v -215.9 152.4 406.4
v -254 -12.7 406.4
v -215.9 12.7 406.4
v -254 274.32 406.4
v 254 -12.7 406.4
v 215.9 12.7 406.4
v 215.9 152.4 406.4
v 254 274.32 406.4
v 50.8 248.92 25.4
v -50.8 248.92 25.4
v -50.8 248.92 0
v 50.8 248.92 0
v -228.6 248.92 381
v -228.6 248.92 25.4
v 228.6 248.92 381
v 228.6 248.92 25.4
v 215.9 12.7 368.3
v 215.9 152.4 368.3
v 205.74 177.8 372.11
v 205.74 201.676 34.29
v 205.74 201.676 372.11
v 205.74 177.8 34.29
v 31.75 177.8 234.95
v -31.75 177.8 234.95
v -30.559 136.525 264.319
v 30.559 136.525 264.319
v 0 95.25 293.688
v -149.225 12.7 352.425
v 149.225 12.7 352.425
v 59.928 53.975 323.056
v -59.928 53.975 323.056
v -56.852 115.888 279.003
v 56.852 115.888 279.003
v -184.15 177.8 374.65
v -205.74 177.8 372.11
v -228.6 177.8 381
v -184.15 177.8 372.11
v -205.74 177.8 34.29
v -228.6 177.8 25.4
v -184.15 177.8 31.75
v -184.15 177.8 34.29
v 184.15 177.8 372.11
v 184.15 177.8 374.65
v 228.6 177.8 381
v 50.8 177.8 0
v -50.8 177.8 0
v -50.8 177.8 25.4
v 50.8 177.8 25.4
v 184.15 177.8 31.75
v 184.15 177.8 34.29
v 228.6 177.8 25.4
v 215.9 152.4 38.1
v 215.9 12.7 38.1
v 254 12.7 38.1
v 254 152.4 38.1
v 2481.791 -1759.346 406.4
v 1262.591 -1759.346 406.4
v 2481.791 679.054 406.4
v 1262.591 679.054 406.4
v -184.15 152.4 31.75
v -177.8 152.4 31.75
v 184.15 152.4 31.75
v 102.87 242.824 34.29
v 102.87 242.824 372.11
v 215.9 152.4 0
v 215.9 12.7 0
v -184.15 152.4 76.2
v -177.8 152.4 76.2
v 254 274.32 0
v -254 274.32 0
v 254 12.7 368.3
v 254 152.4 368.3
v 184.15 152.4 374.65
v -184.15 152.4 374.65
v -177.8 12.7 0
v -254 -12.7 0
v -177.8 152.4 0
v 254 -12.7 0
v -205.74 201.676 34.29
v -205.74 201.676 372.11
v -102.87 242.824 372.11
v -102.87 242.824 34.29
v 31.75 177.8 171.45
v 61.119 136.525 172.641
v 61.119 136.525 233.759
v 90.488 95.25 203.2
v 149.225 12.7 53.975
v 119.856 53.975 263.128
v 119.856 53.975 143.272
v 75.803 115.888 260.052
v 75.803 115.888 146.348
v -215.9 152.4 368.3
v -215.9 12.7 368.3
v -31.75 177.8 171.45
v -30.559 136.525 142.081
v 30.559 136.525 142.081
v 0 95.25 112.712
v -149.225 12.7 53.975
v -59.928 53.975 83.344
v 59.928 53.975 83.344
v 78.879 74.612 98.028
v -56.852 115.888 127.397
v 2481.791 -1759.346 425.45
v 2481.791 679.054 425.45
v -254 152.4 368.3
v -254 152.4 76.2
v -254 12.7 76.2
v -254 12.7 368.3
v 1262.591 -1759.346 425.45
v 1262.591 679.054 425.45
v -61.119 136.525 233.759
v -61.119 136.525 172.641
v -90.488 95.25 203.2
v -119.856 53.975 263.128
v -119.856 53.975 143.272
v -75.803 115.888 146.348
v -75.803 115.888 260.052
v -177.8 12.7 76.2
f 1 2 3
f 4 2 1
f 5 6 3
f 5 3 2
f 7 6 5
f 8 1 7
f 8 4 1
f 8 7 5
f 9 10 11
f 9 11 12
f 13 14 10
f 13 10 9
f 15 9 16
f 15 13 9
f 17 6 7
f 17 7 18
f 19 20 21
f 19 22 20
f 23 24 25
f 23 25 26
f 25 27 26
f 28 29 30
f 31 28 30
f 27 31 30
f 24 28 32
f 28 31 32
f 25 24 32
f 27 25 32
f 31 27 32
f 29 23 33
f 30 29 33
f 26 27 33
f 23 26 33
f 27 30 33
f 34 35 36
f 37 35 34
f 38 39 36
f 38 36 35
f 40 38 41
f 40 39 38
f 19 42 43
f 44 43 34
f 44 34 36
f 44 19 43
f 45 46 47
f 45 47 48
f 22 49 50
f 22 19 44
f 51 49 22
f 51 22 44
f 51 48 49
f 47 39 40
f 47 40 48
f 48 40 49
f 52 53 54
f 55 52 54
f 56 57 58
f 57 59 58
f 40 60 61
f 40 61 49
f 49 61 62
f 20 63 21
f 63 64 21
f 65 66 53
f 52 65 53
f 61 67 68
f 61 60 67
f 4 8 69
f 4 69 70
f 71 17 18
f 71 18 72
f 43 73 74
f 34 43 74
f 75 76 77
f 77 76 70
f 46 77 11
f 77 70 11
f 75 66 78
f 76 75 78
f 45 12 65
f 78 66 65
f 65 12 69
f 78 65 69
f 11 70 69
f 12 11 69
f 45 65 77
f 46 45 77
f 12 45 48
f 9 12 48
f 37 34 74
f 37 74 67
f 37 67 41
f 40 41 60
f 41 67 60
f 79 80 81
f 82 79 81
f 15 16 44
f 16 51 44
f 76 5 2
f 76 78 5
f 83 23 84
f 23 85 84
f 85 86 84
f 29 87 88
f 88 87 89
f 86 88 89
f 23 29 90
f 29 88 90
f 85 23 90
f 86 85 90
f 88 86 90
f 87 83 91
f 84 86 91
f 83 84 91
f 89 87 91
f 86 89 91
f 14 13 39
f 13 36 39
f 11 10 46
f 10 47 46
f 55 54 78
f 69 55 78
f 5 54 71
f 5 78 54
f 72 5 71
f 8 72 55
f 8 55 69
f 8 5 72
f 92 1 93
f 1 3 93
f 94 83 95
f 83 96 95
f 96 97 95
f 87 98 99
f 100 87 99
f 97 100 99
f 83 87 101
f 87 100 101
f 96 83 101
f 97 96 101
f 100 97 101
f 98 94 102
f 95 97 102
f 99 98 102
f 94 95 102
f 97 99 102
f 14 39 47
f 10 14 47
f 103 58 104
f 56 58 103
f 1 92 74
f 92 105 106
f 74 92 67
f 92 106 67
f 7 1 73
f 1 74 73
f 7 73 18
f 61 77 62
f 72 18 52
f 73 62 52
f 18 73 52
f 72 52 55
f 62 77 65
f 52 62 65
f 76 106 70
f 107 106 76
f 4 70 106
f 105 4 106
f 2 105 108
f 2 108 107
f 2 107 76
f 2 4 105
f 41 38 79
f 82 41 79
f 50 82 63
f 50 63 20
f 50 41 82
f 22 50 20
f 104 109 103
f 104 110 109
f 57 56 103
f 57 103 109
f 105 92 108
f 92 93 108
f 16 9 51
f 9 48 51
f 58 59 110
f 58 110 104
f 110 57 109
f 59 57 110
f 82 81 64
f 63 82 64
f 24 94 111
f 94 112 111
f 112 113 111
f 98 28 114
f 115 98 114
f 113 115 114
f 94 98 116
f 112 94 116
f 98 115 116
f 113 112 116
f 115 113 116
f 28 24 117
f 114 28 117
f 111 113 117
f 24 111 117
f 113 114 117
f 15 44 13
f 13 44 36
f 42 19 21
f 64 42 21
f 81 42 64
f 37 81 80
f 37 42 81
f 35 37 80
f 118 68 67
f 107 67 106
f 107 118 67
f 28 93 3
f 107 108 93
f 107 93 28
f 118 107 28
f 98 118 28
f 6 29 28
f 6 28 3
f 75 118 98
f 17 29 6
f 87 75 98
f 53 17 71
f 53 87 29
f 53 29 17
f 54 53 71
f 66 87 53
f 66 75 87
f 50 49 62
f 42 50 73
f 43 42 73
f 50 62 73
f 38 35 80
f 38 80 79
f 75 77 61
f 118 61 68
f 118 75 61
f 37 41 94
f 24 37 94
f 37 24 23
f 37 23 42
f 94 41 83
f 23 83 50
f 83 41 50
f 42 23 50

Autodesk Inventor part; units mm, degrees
ref_plane "YZ Plane" through (0, 0, 0) normal (1, 0, 0) x (0, 1, 0)
ref_plane "XZ Plane" through (0, 0, 0) normal (0, 1, 0) x (-1, 0, 0)
sketch "Sketch1" plane through (0, 0, 0) normal (0, 0, 1) x (1, 0, 0)
  line L0 (-254, 12.7) -> (254, 12.7)
  line L1 (254, 12.7) -> (254, -12.7)
  line L2 (254, -12.7) -> (-254, -12.7)
  line L3 (-254, -12.7) -> (-254, 12.7)
  point P0 (0, 0)
  point P1 (0, -12.7)
  point P2 (254, 0)
  dimension "d0" = 25.4
  dimension "d1" = 508
extrude "Extrusion1" add sketch "Sketch1" along normal blind 406.4
sketch "Sketch2" plane through (-254, 12.7, 0) normal (0, 1, 0) x (1, 0, 0)
  line L0 (403.225, -53.975) -> (403.225, -352.425)
  line L1 (403.225, -352.425) -> (104.775, -352.425)
  line L2 (104.775, -352.425) -> (104.775, -53.975)
  line L3 (104.775, -53.975) -> (403.225, -53.975)
  line L4 (0, 0) -> (0, -406.4) projected
  line L5 (0, 0) -> (508, 0) projected
  point P0 (254, 0)
  point P1 (254, -203.2)
  point P2 (0, -203.2)
  point P3 (254, 0)
  dimension "d4" = 298.45
ref_plane "Work Plane1" through (-254, 177.8, 0) normal (0, 1, 0) x (1, 0, 0)
sketch "Sketch3" plane through (-254, 177.8, 0) normal (0, 1, 0) x (1, 0, 0)
  line L0 (285.75, -171.45) -> (285.75, -234.95)
  line L1 (285.75, -234.95) -> (222.25, -234.95)
  line L2 (222.25, -234.95) -> (222.25, -171.45)
  line L3 (222.25, -171.45) -> (285.75, -171.45)
  line L4 (0, 0) -> (0, -406.4) projected
  point P0 (254, 0)
  point P1 (254, -203.2)
  point P2 (0, -203.2)
  dimension "d6" = 63.5
loft "Loft1" add profiles "Sketch3", "Sketch2"
sketch "Sketch4" plane through (-31.75, 177.8, 171.45) normal (0, 1, 0) x (1, 0, 0)
  line L0 (-173.99, 137.16) -> (237.49, 137.16)
  line L1 (237.49, 137.16) -> (237.49, -200.66)
  line L2 (237.49, -200.66) -> (-173.99, -200.66)
  line L3 (-173.99, -200.66) -> (-173.99, 137.16)
  line L4 (285.75, 171.45) -> (285.75, -234.95) projected
  point P0 (31.75, 171.45)
  point P1 (31.75, 137.16)
  point P2 (237.49, -31.75)
  point P3 (285.75, -31.75)
  dimension "d11" = 411.48
  dimension "d12" = 337.82
extrude "Extrusion2" add sketch "Sketch4" along normal blind 65.024
sketch "Sketch5" plane through (-205.74, 177.8, 372.11) normal (0, 0, 1) x (1, 0, 0)
  line L0 (0, 0) -> (0, 23.876)
  line L1 (0, 0) -> (0, 65.024) projected
  line L2 (102.87, 65.024) -> (308.61, 65.024)
  line L3 (0, 23.876) -> (102.87, 65.024)
  line L4 (0, 65.024) -> (411.48, 65.024) projected
  line L5 (0, 65.024) -> (102.87, 65.024)
  line L6 (0, 65.024) -> (0, 23.876)
  line L7 (308.61, 65.024) -> (411.48, 23.876)
  line L8 (411.48, 23.876) -> (411.48, 65.024)
  line L9 (411.48, 65.024) -> (308.61, 65.024)
  point P0 (205.74, -177.8)
  point P1 (205.74, 65.024)
  point P2 (205.74, 0)
  dimension "d15" = 23.876
  dimension "d16" = 205.74
extrude "Extrusion3" cut sketch "Sketch5" against normal blind 390.5885
sketch "Sketch6" plane through (-254, 12.7, 0) normal (0, 1, 0) x (1, 0, 0)
  line L0 (0, 0) -> (76.2, 0)
  line L1 (76.2, 0) -> (76.2, -76.2)
  line L2 (76.2, -76.2) -> (0, -76.2)
  line L3 (0, -76.2) -> (0, 0)
  line L4 (0, -406.4) -> (38.1, -406.4)
  line L5 (38.1, -406.4) -> (38.1, -368.3)
  line L6 (38.1, -368.3) -> (0, -368.3)
  line L7 (0, -368.3) -> (0, -406.4)
  line L8 (508, 0) -> (469.9, 0)
  line L9 (469.9, 0) -> (469.9, -38.1)
  line L10 (469.9, -38.1) -> (508, -38.1)
  line L11 (508, -38.1) -> (508, 0)
  line L12 (508, -406.4) -> (469.9, -406.4)
  line L13 (508, -368.3) -> (508, -406.4)
  line L14 (469.9, -368.3) -> (508, -368.3)
  line L15 (469.9, -406.4) -> (469.9, -368.3)
  point P0 (254, 0)
  point P1 (38.1, -38.1)
  point P2 (38.1, 0)
  dimension "d19" = 76.2
extrude "Extrusion4" add sketch "Sketch6" along normal blind 139.7
sketch "Sketch7" plane through (-254, 152.4, 0) normal (0, 1, 0) x (1, 0, 0)
  line L0 (469.9, -406.4) -> (508, -406.4)
  line L1 (0, 0) -> (508, 0)
  line L2 (508, 0) -> (508, -406.4)
  line L3 (508, -406.4) -> (0, -406.4)
  line L4 (0, -406.4) -> (0, 0)
  line L5 (69.85, -31.75) -> (438.15, -31.75)
  line L6 (438.15, -31.75) -> (438.15, -374.65)
  line L7 (438.15, -374.65) -> (69.85, -374.65)
  line L8 (69.85, -374.65) -> (69.85, -31.75)
  line L9 (469.9, -368.3) -> (469.9, -406.4)
  line L10 (38.1, -406.4) -> (38.1, -368.3)
  line L11 (38.1, -38.1) -> (38.1, 0)
  line L12 (469.9, 0) -> (469.9, -38.1)
  point P0 (254, 0)
  point P1 (254, 0)
  dimension "d22" = 31.75
  dimension "d23" = 31.75
  dimension "d24" = 31.75
  dimension "d25" = 31.75
  dimension "d26" = 31.75
  dimension "d27" = 31.75
extrude "Extrusion5" add sketch "Sketch7" along normal blind 25.4
sketch "Sketch8" plane through (-254, 177.8, 0) normal (0, 1, 0) x (1, 0, 0)
  line L0 (0, 0) -> (508, 0)
  line L1 (508, 0) -> (508, -406.4)
  line L2 (508, -406.4) -> (0, -406.4)
  line L3 (0, -406.4) -> (0, 0)
  line L4 (25.4, -25.4) -> (482.6, -25.4)
  line L5 (482.6, -25.4) -> (482.6, -381)
  line L6 (482.6, -381) -> (25.4, -381)
  line L7 (25.4, -381) -> (25.4, -25.4)
  line L8 (304.8, 0) -> (304.8, -25.4)
  line L9 (304.8, -25.4) -> (203.2, -25.4)
  line L10 (203.2, -25.4) -> (203.2, 0)
  point P0 (254, 0)
  point P1 (254, 0)
  dimension "d30" = 25.4
  dimension "d31" = 25.4
  dimension "d32" = 25.4
  dimension "d33" = 25.4
extrude "Extrusion6" add sketch "Sketch8" along normal blind 71.12 contours L0 L10 L4 L7 L6 L5 L8 L1 L2 L3
sketch "Sketch9" plane through (0, 0, 406.4) normal (0, 0, 1) x (1, 0, 0)
  line L0 (-254, 248.92) -> (254, 248.92) projected
  line L1 (-254, 248.92) -> (254, 248.92)
  line L2 (254, 248.92) -> (254, 274.32)
  line L3 (254, 274.32) -> (-254, 274.32)
  line L4 (-254, 274.32) -> (-254, 248.92)
  line L5 (254, -12.7) -> (254, 248.92) projected
  point P0 (0, 0)
  point P1 (254, 261.62)
  point P2 (254, 118.11)
  dimension "d36" = 25.4
extrude "Extrusion7" add sketch "Sketch9" against normal blind 406.4
sketch "Sketch10" plane through (0, 0, 406.4) normal (0, 0, 1) x (1, 0, 0)
  line L0 (1262.5907, 679.0542) -> (2481.7907, 679.0542)
  line L1 (2481.7907, 679.0542) -> (2481.7907, -1759.3458)
  line L2 (2481.7907, -1759.3458) -> (1262.5907, -1759.3458)
  line L3 (1262.5907, -1759.3458) -> (1262.5907, 679.0542)
  point P0 (0, 0)
  dimension "d39" = 1219.2
  dimension "d40" = 2438.4
extrude "Extrusion8" add sketch "Sketch10" along normal blind 19.05
sketch "Sketch11" plane through (0, 0, 425.45) normal (0, 0, 1) x (1, 0, 0)
  line L0 (1262.5907, 679.0542) -> (1262.5907, -1759.3458) projected
  line L1 (1262.5907, 679.0542) -> (1668.9907, 679.0542)
  line L2 (1668.9907, 679.0542) -> (1668.9907, 171.0542)
  line L3 (1668.9907, 171.0542) -> (1262.5907, 171.0542)
  line L4 (1262.5907, 171.0542) -> (1262.5907, 679.0542)
  line L5 (1668.9907, 679.0542) -> (2075.3907, 679.0542)
  line L6 (2075.3907, 679.0542) -> (2075.3907, 171.0542)
  line L7 (2075.3907, 171.0542) -> (1668.9907, 171.0542)
  line L8 (1668.9907, 171.0542) -> (1668.9907, 679.0542)
  line L9 (2075.3907, 679.0542) -> (2481.7907, 679.0542)
  line L10 (2481.7907, 679.0542) -> (2481.7907, 171.0542)
  line L11 (2481.7907, 171.0542) -> (2075.3907, 171.0542)
  line L12 (2075.3907, 171.0542) -> (2075.3907, 679.0542)
  line L13 (1262.5907, 171.0542) -> (1745.1907, 171.0542)
  line L14 (1745.1907, 171.0542) -> (1745.1907, 99.9342)
  line L15 (1745.1907, 99.9342) -> (1262.5907, 99.9342)
  line L16 (1262.5907, 99.9342) -> (1262.5907, 171.0542)
  line L17 (1745.1907, 99.9342) -> (2227.7907, 99.9342)
  line L18 (2227.7907, 99.9342) -> (2227.7907, 171.0542)
  line L19 (2227.7907, 171.0542) -> (1745.1907, 171.0542)
  line L20 (1745.1907, 171.0542) -> (1745.1907, 99.9342)
  line L21 (2298.9107, 171.0542) -> (2227.7907, 171.0542)
  line L22 (2298.9107, 171.0542) -> (2370.0307, 171.0542)
  line L23 (1262.5907, 99.9342) -> (1300.6907, 99.9342)
  line L24 (1300.6907, 99.9342) -> (1300.6907, -39.7658)
  line L25 (1300.6907, -39.7658) -> (1262.5907, -39.7658)
  line L26 (1262.5907, -39.7658) -> (1262.5907, 99.9342)
  line L27 (1300.6907, 99.9342) -> (1338.7907, 99.9342)
  line L28 (1338.7907, 99.9342) -> (1338.7907, -39.7658)
  line L29 (1338.7907, -39.7658) -> (1300.6907, -39.7658)
  line L30 (1300.6907, -39.7658) -> (1300.6907, 99.9342)
  line L31 (1338.7907, 99.9342) -> (1376.8907, 99.9342)
  line L32 (1376.8907, 99.9342) -> (1376.8907, -39.7658)
  line L33 (1376.8907, -39.7658) -> (1338.7907, -39.7658)
  line L34 (1338.7907, -39.7658) -> (1338.7907, 99.9342)
  line L35 (1376.8907, 99.9342) -> (1414.9907, 99.9342)
  line L36 (1414.9907, 99.9342) -> (1414.9907, -39.7658)
  line L37 (1414.9907, -39.7658) -> (1376.8907, -39.7658)
  line L38 (1376.8907, -39.7658) -> (1376.8907, 99.9342)
  line L39 (1414.9907, 99.9342) -> (1453.0907, 99.9342)
  line L40 (1453.0907, 99.9342) -> (1453.0907, -39.7658)
  line L41 (1453.0907, -39.7658) -> (1414.9907, -39.7658)
  line L42 (1414.9907, -39.7658) -> (1414.9907, 99.9342)
  line L43 (1453.0907, 99.9342) -> (1491.1907, 99.9342)
  line L44 (1491.1907, 99.9342) -> (1491.1907, -39.7658)
  line L45 (1491.1907, -39.7658) -> (1453.0907, -39.7658)
  line L46 (1453.0907, -39.7658) -> (1453.0907, 99.9342)
  line L47 (1491.1907, 99.9342) -> (1567.3907, 99.9342)
  line L48 (1567.3907, 99.9342) -> (1567.3907, -39.7658)
  line L49 (1567.3907, -39.7658) -> (1491.1907, -39.7658)
  line L50 (1491.1907, -39.7658) -> (1491.1907, 99.9342)
  line L51 (1567.3907, 99.9342) -> (1643.5907, 99.9342)
  line L52 (1643.5907, 99.9342) -> (1643.5907, -39.7658)
  line L53 (1643.5907, -39.7658) -> (1567.3907, -39.7658)
  line L54 (1567.3907, -39.7658) -> (1567.3907, 99.9342)
  line L55 (1643.5907, 99.9342) -> (1719.7907, 99.9342)
  line L56 (1719.7907, 99.9342) -> (1719.7907, -39.7658)
  line L57 (1719.7907, -39.7658) -> (1643.5907, -39.7658)
  line L58 (1643.5907, -39.7658) -> (1643.5907, 99.9342)
  line L59 (1719.7907, 99.9342) -> (1795.9907, 99.9342)
  line L60 (1795.9907, 99.9342) -> (1795.9907, -39.7658)
  line L61 (1795.9907, -39.7658) -> (1719.7907, -39.7658)
  line L62 (1719.7907, -39.7658) -> (1719.7907, 99.9342)
  line L63 (1795.9907, 99.9342) -> (2176.9907, 99.9342)
  line L64 (2176.9907, 99.9342) -> (2176.9907, 28.8142)
  line L65 (2176.9907, 28.8142) -> (1795.9907, 28.8142)
  line L66 (1795.9907, 28.8142) -> (1795.9907, 99.9342)
  line L67 (1795.9907, 28.8142) -> (2176.9907, 28.8142)
  line L68 (2176.9907, 28.8142) -> (2176.9907, -42.3058)
  line L69 (2176.9907, -42.3058) -> (1795.9907, -42.3058)
  line L70 (1795.9907, -42.3058) -> (1795.9907, 28.8142)
  point P0 (0, 0)
  dimension "d43" = 508
  dimension "d44" = 406.4
  dimension "d45" = 406.4
  dimension "d46" = 406.4
  dimension "d47" = 71.12
  dimension "d48" = 482.6
  dimension "d49" = 482.6
  dimension "d53" = 139.7
  dimension "d54" = 38.1
  dimension "d55" = 38.1
  dimension "d56" = 38.1
  dimension "d57" = 38.1
  dimension "d58" = 38.1
  dimension "d59" = 38.1
  dimension "d60" = 76.2
  dimension "d61" = 76.2
  dimension "d62" = 76.2
  dimension "d63" = 76.2
  dimension "d64" = 139.7
  dimension "d65" = 381
  dimension "d66" = 71.12
  dimension "d67" = 71.12
properties part number "display version 3"
